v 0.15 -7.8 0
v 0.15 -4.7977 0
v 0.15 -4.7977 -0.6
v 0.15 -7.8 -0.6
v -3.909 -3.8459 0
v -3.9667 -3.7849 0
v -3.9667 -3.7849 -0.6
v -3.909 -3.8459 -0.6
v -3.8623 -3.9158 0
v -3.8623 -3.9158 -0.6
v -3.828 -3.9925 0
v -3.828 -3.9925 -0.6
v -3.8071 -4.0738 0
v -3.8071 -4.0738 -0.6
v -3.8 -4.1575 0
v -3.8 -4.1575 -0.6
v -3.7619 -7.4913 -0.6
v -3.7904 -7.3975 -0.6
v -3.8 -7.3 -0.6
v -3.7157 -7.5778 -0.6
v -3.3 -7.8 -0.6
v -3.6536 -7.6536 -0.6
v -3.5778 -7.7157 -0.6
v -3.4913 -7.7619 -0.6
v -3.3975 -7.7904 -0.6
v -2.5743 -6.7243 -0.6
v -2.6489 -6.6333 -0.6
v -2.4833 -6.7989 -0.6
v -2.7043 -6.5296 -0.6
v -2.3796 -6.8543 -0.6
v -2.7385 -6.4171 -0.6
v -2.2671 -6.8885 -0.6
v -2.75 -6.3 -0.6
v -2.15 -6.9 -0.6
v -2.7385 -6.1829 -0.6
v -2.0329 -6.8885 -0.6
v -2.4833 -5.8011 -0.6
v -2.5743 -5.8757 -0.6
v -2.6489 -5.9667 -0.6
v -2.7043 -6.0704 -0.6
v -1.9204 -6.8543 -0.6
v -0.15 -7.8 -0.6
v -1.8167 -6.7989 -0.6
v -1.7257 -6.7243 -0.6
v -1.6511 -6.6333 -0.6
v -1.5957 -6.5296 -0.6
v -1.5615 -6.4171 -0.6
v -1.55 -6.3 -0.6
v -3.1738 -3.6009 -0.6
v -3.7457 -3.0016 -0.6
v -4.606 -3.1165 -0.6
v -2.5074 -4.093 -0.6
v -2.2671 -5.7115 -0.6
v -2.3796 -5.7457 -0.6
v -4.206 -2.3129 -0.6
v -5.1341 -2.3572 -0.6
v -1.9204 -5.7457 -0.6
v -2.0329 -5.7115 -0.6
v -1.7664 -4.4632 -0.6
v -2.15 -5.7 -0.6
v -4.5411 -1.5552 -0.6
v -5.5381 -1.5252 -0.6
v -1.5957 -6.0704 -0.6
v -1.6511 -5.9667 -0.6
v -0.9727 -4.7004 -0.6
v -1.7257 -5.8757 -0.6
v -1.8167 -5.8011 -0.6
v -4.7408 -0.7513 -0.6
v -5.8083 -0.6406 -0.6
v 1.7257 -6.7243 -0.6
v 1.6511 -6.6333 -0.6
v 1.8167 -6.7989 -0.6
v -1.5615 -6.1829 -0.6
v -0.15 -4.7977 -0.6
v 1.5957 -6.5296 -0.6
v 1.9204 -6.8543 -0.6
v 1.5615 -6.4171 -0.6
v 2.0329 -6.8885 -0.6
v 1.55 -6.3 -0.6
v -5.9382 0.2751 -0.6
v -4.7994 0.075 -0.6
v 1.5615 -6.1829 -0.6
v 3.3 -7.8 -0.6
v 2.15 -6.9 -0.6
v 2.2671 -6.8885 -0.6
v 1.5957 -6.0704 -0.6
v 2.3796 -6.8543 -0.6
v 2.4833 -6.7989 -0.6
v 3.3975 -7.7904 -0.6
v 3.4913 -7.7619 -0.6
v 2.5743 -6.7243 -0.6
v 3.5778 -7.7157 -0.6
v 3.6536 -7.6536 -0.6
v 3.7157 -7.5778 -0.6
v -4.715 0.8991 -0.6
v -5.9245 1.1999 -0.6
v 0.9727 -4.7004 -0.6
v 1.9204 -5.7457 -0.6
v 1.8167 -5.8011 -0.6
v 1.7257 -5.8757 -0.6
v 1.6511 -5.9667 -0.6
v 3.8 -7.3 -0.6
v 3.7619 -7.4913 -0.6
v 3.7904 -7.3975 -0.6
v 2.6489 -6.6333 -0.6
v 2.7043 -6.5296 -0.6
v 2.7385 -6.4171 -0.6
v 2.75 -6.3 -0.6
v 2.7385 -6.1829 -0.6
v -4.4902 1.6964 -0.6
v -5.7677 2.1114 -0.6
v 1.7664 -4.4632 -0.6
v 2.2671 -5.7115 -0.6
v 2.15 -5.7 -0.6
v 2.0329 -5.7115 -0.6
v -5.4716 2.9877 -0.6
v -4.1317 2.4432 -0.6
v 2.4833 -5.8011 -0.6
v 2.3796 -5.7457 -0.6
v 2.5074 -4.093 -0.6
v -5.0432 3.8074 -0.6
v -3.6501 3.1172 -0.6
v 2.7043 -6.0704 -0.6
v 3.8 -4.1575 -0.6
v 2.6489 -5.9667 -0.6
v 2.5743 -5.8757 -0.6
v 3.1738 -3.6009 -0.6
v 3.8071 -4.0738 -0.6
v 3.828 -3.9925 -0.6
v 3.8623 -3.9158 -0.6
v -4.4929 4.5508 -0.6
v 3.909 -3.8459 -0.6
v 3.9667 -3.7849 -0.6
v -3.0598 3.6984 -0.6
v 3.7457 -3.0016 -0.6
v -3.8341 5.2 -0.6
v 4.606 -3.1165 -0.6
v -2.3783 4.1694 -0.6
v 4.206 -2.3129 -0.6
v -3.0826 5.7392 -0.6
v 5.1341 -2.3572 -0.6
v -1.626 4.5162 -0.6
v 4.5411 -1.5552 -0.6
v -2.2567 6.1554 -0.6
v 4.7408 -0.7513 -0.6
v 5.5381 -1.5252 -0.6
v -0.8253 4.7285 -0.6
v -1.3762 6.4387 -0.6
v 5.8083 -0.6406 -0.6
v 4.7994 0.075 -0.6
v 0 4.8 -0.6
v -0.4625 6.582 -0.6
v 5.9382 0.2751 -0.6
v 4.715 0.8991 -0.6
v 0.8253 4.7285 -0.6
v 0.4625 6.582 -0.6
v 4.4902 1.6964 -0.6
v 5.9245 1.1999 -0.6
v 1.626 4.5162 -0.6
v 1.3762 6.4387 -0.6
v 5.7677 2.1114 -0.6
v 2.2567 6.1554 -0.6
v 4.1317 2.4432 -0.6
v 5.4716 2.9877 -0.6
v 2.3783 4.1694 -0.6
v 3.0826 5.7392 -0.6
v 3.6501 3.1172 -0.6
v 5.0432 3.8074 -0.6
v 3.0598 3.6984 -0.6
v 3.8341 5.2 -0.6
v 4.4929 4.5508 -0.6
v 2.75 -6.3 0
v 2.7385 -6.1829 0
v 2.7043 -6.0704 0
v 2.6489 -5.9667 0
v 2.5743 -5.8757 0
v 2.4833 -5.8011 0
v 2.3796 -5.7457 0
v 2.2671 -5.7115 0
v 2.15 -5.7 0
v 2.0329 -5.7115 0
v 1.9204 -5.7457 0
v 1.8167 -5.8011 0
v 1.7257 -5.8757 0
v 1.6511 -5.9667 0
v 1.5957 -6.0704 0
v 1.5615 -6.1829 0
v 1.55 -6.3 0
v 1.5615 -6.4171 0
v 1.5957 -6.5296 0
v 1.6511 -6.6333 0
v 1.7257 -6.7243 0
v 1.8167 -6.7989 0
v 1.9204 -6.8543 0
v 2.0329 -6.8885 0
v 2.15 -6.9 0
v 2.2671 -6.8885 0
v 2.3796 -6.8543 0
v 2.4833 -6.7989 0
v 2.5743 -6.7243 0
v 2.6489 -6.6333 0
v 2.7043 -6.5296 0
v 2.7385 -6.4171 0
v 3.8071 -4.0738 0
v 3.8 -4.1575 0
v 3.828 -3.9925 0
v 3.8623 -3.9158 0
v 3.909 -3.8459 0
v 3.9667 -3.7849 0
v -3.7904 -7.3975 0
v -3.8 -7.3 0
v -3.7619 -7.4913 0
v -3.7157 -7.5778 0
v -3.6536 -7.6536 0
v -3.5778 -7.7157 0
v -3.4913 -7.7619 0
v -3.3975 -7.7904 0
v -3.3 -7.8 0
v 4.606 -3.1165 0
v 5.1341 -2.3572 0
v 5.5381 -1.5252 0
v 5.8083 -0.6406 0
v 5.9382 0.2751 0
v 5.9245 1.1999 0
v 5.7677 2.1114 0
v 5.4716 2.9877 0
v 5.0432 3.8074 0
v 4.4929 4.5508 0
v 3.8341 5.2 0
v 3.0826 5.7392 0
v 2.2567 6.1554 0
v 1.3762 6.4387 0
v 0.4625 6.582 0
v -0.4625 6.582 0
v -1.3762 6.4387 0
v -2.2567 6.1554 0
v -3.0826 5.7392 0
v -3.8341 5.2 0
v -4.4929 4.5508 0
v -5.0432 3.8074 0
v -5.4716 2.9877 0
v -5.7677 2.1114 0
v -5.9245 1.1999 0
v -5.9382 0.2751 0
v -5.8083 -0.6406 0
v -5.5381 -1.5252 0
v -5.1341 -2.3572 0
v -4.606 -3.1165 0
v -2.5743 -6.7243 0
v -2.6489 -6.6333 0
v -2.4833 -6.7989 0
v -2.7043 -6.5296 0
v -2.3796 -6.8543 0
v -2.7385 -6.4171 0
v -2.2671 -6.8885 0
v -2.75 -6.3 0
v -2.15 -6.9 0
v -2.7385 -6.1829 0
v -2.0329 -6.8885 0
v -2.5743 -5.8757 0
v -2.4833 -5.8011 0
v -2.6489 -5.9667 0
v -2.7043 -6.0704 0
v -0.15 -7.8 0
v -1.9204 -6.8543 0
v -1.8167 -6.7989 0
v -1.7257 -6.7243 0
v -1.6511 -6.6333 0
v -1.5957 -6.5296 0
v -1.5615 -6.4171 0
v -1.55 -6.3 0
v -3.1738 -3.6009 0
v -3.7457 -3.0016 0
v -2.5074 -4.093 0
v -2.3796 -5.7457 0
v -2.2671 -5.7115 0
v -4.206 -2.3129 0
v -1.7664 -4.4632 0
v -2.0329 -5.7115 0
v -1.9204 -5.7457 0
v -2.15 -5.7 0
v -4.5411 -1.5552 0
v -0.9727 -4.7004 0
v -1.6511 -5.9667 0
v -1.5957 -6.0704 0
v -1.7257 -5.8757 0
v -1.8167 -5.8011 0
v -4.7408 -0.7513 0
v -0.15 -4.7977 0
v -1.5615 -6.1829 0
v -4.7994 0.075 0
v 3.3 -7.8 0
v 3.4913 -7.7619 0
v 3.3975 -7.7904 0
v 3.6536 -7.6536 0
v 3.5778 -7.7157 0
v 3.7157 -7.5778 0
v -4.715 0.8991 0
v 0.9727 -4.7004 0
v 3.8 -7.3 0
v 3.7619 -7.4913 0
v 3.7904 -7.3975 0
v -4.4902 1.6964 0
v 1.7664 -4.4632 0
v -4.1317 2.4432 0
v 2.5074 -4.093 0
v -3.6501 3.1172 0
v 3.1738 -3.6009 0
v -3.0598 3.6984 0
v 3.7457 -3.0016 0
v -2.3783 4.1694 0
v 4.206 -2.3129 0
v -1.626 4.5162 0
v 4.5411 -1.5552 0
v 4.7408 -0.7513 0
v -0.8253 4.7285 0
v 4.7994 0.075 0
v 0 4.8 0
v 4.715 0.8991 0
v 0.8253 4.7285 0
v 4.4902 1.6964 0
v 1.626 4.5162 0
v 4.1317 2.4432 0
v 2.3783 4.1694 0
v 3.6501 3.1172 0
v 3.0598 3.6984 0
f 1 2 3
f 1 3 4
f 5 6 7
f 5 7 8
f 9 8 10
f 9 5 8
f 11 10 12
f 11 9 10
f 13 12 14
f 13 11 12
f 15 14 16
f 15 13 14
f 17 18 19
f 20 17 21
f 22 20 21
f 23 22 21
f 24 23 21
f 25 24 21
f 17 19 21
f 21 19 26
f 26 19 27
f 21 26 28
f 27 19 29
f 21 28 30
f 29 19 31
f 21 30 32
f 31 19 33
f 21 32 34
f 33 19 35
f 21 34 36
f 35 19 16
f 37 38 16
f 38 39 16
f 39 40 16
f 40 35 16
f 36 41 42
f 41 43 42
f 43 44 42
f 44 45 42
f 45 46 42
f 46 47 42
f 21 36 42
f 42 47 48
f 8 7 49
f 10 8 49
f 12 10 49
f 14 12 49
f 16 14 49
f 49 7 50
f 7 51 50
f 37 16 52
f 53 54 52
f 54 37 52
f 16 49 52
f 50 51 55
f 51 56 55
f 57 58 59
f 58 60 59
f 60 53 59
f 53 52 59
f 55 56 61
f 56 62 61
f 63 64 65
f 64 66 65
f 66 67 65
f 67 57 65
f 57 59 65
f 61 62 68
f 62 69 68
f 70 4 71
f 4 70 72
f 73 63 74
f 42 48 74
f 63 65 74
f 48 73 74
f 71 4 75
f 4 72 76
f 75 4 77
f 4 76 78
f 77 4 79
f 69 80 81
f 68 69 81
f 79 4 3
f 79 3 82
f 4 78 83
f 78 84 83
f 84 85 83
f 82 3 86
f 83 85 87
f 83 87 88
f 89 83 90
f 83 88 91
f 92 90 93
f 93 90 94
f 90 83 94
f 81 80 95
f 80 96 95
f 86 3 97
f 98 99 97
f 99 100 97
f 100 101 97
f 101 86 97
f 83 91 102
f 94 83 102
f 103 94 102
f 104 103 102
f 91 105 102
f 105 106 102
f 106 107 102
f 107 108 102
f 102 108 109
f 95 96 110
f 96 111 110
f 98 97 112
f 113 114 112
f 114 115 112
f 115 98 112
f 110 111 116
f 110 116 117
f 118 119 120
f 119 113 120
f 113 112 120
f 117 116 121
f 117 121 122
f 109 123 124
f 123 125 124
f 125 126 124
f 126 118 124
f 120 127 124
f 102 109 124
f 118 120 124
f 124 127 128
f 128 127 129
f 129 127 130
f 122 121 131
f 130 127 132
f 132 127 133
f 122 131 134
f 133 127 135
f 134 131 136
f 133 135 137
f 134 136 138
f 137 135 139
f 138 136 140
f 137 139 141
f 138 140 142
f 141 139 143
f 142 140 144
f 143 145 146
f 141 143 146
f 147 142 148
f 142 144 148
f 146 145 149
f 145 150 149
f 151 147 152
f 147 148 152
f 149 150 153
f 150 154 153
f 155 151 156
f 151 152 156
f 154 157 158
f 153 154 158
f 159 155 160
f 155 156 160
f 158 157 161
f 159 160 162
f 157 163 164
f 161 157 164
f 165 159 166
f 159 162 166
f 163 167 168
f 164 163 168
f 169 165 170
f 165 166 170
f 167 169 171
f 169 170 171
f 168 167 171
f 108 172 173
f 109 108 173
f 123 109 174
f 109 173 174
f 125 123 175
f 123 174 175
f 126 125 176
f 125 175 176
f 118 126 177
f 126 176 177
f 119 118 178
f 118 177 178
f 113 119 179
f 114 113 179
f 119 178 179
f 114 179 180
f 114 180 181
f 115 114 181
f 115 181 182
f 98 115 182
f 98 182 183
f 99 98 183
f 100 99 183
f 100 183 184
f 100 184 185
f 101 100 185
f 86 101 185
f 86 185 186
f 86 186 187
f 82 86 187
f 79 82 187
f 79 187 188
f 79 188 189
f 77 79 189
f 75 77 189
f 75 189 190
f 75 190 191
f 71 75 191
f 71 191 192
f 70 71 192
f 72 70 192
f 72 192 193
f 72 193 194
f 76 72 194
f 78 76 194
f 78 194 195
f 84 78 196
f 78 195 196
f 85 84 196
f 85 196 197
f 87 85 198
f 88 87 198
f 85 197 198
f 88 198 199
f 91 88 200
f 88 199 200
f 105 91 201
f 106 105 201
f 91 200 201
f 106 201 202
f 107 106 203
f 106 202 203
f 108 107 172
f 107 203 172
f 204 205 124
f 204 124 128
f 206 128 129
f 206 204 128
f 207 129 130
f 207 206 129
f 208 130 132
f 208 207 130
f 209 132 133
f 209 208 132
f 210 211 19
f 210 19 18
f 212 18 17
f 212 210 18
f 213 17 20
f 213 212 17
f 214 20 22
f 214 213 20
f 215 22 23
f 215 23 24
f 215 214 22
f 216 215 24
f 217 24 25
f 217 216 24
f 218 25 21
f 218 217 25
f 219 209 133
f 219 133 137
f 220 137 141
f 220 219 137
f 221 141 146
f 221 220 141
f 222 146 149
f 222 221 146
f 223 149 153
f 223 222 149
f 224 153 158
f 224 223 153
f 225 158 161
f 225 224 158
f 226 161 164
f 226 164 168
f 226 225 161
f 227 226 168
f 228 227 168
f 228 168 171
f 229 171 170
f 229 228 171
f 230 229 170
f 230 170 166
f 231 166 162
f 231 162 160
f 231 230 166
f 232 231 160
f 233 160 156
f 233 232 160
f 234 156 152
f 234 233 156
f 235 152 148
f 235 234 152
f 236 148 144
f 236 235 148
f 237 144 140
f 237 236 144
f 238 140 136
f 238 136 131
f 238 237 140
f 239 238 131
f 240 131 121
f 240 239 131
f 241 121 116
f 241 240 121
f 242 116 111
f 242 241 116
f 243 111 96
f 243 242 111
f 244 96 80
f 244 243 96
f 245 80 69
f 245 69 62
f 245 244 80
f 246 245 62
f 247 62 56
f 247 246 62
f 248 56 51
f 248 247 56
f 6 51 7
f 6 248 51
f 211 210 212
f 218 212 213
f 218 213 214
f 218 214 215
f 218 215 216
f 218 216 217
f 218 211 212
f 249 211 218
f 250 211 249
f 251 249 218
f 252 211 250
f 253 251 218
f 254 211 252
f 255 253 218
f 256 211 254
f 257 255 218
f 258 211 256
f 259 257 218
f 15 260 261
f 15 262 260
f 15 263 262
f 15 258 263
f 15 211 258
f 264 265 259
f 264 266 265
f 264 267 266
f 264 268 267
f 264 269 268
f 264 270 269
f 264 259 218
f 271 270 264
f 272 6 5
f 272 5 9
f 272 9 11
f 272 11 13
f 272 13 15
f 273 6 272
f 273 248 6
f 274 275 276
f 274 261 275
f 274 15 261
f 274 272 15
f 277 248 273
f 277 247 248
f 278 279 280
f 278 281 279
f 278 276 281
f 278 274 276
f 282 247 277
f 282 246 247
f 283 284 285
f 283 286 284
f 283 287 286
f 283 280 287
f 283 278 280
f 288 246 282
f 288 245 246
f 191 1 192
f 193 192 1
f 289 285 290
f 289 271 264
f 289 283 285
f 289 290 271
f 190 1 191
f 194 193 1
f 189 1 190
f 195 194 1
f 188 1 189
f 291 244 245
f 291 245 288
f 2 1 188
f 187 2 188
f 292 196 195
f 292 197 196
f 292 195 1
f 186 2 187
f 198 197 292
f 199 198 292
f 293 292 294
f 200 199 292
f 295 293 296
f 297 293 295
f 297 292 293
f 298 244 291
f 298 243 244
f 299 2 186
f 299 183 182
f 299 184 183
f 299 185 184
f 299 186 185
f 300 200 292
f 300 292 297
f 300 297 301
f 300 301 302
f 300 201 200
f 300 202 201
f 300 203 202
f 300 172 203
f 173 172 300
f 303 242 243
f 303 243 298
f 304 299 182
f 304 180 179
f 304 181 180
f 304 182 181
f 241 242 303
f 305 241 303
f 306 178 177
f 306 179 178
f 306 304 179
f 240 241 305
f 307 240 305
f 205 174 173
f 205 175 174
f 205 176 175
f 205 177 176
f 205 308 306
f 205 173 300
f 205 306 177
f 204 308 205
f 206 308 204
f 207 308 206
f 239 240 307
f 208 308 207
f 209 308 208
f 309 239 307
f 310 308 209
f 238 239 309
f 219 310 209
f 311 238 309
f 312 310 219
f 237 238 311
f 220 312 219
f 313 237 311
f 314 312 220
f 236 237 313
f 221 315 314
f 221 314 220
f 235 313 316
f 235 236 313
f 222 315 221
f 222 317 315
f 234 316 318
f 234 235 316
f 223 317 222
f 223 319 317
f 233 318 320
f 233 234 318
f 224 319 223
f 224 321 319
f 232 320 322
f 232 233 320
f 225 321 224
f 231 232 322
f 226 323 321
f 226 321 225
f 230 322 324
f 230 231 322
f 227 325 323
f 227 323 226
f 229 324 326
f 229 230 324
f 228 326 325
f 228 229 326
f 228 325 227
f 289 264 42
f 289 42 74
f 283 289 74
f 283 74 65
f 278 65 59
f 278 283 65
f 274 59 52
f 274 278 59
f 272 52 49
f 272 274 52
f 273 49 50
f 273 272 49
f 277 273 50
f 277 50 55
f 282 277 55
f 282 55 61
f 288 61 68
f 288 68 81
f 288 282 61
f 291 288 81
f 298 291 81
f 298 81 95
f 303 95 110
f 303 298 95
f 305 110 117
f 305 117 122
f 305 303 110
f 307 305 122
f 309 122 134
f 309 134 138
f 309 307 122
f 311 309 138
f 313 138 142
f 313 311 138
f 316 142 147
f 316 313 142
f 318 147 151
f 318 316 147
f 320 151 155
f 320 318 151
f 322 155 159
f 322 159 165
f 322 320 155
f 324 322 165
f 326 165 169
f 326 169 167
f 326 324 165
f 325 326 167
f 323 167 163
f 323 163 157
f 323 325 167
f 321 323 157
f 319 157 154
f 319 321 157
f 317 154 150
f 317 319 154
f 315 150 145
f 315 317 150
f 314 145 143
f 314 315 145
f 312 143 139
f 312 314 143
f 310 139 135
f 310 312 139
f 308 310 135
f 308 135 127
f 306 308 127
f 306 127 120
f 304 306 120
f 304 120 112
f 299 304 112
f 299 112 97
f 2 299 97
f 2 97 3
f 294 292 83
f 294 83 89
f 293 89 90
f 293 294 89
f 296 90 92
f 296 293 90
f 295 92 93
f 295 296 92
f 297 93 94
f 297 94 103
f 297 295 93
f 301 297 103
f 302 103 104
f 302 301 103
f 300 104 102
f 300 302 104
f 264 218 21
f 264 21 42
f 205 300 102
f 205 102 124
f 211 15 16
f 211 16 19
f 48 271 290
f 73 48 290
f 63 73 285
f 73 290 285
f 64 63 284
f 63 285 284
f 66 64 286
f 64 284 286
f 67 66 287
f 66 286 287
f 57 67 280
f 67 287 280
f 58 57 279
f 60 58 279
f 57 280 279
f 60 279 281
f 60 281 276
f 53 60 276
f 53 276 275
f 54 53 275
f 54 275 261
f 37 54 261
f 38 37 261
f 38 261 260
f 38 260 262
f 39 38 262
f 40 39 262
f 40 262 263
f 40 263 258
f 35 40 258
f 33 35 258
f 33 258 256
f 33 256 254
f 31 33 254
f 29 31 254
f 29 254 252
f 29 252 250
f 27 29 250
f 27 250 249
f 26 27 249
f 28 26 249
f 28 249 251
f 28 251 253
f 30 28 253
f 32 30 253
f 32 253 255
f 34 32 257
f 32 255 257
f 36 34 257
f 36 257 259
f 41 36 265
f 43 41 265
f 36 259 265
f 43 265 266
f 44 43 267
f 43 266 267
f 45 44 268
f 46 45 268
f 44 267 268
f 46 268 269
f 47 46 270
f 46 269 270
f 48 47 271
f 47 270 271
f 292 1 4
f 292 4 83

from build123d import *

# Parameters (mm, degrees)
BOSS_EXTRUDE1_DEPTH = 0.6
SKETCH2_R           = 0.6
CUT_EXTRUDE1_DEPTH  = 1.6


with BuildPart() as part:
    # Sketch1 → Boss-Extrude1 (new body)
    with BuildSketch(Plane.XY):
        with BuildLine():
            Line((-3.8, -4.157546152), (-3.8, -7.3))
            ThreePointArc((-3.8, -7.3), (-3.653553391, -7.653553391), (-3.3, -7.8))
            Line((-3.3, -7.8), (-0.15, -7.8))
            Line((-0.15, -7.8), (-0.15, -4.797655678))
            ThreePointArc((-0.15, -4.797655678), (0, 4.8), (0.15, -4.797655678))
            Line((0.15, -4.797655678), (0.15, -7.8))
            Line((0.15, -7.8), (3.3, -7.8))
            ThreePointArc((3.3, -7.8), (3.653553391, -7.653553391), (3.8, -7.3))
            Line((3.8, -7.3), (3.8, -4.157546152))
            ThreePointArc((3.8, -4.157546152), (3.843564535, -3.953422006), (3.966666667, -3.784868155))
            ThreePointArc((3.966666667, -3.784868155), (0, 6.6), (-3.966666667, -3.784868155))
            ThreePointArc((-3.966666667, -3.784868155), (-3.843564535, -3.953422006), (-3.8, -4.157546152))
        make_face()
    extrude(amount=-BOSS_EXTRUDE1_DEPTH)

    # Sketch2 → Cut-Extrude1 (cut, through all)
    with BuildSketch(Plane.XY):
        with Locations((-2.15, -6.3)):
            Circle(SKETCH2_R)
        with Locations((2.15, -6.3)):
            Circle(SKETCH2_R)
    extrude(amount=-CUT_EXTRUDE1_DEPTH, mode=Mode.SUBTRACT)


solid = part.part
